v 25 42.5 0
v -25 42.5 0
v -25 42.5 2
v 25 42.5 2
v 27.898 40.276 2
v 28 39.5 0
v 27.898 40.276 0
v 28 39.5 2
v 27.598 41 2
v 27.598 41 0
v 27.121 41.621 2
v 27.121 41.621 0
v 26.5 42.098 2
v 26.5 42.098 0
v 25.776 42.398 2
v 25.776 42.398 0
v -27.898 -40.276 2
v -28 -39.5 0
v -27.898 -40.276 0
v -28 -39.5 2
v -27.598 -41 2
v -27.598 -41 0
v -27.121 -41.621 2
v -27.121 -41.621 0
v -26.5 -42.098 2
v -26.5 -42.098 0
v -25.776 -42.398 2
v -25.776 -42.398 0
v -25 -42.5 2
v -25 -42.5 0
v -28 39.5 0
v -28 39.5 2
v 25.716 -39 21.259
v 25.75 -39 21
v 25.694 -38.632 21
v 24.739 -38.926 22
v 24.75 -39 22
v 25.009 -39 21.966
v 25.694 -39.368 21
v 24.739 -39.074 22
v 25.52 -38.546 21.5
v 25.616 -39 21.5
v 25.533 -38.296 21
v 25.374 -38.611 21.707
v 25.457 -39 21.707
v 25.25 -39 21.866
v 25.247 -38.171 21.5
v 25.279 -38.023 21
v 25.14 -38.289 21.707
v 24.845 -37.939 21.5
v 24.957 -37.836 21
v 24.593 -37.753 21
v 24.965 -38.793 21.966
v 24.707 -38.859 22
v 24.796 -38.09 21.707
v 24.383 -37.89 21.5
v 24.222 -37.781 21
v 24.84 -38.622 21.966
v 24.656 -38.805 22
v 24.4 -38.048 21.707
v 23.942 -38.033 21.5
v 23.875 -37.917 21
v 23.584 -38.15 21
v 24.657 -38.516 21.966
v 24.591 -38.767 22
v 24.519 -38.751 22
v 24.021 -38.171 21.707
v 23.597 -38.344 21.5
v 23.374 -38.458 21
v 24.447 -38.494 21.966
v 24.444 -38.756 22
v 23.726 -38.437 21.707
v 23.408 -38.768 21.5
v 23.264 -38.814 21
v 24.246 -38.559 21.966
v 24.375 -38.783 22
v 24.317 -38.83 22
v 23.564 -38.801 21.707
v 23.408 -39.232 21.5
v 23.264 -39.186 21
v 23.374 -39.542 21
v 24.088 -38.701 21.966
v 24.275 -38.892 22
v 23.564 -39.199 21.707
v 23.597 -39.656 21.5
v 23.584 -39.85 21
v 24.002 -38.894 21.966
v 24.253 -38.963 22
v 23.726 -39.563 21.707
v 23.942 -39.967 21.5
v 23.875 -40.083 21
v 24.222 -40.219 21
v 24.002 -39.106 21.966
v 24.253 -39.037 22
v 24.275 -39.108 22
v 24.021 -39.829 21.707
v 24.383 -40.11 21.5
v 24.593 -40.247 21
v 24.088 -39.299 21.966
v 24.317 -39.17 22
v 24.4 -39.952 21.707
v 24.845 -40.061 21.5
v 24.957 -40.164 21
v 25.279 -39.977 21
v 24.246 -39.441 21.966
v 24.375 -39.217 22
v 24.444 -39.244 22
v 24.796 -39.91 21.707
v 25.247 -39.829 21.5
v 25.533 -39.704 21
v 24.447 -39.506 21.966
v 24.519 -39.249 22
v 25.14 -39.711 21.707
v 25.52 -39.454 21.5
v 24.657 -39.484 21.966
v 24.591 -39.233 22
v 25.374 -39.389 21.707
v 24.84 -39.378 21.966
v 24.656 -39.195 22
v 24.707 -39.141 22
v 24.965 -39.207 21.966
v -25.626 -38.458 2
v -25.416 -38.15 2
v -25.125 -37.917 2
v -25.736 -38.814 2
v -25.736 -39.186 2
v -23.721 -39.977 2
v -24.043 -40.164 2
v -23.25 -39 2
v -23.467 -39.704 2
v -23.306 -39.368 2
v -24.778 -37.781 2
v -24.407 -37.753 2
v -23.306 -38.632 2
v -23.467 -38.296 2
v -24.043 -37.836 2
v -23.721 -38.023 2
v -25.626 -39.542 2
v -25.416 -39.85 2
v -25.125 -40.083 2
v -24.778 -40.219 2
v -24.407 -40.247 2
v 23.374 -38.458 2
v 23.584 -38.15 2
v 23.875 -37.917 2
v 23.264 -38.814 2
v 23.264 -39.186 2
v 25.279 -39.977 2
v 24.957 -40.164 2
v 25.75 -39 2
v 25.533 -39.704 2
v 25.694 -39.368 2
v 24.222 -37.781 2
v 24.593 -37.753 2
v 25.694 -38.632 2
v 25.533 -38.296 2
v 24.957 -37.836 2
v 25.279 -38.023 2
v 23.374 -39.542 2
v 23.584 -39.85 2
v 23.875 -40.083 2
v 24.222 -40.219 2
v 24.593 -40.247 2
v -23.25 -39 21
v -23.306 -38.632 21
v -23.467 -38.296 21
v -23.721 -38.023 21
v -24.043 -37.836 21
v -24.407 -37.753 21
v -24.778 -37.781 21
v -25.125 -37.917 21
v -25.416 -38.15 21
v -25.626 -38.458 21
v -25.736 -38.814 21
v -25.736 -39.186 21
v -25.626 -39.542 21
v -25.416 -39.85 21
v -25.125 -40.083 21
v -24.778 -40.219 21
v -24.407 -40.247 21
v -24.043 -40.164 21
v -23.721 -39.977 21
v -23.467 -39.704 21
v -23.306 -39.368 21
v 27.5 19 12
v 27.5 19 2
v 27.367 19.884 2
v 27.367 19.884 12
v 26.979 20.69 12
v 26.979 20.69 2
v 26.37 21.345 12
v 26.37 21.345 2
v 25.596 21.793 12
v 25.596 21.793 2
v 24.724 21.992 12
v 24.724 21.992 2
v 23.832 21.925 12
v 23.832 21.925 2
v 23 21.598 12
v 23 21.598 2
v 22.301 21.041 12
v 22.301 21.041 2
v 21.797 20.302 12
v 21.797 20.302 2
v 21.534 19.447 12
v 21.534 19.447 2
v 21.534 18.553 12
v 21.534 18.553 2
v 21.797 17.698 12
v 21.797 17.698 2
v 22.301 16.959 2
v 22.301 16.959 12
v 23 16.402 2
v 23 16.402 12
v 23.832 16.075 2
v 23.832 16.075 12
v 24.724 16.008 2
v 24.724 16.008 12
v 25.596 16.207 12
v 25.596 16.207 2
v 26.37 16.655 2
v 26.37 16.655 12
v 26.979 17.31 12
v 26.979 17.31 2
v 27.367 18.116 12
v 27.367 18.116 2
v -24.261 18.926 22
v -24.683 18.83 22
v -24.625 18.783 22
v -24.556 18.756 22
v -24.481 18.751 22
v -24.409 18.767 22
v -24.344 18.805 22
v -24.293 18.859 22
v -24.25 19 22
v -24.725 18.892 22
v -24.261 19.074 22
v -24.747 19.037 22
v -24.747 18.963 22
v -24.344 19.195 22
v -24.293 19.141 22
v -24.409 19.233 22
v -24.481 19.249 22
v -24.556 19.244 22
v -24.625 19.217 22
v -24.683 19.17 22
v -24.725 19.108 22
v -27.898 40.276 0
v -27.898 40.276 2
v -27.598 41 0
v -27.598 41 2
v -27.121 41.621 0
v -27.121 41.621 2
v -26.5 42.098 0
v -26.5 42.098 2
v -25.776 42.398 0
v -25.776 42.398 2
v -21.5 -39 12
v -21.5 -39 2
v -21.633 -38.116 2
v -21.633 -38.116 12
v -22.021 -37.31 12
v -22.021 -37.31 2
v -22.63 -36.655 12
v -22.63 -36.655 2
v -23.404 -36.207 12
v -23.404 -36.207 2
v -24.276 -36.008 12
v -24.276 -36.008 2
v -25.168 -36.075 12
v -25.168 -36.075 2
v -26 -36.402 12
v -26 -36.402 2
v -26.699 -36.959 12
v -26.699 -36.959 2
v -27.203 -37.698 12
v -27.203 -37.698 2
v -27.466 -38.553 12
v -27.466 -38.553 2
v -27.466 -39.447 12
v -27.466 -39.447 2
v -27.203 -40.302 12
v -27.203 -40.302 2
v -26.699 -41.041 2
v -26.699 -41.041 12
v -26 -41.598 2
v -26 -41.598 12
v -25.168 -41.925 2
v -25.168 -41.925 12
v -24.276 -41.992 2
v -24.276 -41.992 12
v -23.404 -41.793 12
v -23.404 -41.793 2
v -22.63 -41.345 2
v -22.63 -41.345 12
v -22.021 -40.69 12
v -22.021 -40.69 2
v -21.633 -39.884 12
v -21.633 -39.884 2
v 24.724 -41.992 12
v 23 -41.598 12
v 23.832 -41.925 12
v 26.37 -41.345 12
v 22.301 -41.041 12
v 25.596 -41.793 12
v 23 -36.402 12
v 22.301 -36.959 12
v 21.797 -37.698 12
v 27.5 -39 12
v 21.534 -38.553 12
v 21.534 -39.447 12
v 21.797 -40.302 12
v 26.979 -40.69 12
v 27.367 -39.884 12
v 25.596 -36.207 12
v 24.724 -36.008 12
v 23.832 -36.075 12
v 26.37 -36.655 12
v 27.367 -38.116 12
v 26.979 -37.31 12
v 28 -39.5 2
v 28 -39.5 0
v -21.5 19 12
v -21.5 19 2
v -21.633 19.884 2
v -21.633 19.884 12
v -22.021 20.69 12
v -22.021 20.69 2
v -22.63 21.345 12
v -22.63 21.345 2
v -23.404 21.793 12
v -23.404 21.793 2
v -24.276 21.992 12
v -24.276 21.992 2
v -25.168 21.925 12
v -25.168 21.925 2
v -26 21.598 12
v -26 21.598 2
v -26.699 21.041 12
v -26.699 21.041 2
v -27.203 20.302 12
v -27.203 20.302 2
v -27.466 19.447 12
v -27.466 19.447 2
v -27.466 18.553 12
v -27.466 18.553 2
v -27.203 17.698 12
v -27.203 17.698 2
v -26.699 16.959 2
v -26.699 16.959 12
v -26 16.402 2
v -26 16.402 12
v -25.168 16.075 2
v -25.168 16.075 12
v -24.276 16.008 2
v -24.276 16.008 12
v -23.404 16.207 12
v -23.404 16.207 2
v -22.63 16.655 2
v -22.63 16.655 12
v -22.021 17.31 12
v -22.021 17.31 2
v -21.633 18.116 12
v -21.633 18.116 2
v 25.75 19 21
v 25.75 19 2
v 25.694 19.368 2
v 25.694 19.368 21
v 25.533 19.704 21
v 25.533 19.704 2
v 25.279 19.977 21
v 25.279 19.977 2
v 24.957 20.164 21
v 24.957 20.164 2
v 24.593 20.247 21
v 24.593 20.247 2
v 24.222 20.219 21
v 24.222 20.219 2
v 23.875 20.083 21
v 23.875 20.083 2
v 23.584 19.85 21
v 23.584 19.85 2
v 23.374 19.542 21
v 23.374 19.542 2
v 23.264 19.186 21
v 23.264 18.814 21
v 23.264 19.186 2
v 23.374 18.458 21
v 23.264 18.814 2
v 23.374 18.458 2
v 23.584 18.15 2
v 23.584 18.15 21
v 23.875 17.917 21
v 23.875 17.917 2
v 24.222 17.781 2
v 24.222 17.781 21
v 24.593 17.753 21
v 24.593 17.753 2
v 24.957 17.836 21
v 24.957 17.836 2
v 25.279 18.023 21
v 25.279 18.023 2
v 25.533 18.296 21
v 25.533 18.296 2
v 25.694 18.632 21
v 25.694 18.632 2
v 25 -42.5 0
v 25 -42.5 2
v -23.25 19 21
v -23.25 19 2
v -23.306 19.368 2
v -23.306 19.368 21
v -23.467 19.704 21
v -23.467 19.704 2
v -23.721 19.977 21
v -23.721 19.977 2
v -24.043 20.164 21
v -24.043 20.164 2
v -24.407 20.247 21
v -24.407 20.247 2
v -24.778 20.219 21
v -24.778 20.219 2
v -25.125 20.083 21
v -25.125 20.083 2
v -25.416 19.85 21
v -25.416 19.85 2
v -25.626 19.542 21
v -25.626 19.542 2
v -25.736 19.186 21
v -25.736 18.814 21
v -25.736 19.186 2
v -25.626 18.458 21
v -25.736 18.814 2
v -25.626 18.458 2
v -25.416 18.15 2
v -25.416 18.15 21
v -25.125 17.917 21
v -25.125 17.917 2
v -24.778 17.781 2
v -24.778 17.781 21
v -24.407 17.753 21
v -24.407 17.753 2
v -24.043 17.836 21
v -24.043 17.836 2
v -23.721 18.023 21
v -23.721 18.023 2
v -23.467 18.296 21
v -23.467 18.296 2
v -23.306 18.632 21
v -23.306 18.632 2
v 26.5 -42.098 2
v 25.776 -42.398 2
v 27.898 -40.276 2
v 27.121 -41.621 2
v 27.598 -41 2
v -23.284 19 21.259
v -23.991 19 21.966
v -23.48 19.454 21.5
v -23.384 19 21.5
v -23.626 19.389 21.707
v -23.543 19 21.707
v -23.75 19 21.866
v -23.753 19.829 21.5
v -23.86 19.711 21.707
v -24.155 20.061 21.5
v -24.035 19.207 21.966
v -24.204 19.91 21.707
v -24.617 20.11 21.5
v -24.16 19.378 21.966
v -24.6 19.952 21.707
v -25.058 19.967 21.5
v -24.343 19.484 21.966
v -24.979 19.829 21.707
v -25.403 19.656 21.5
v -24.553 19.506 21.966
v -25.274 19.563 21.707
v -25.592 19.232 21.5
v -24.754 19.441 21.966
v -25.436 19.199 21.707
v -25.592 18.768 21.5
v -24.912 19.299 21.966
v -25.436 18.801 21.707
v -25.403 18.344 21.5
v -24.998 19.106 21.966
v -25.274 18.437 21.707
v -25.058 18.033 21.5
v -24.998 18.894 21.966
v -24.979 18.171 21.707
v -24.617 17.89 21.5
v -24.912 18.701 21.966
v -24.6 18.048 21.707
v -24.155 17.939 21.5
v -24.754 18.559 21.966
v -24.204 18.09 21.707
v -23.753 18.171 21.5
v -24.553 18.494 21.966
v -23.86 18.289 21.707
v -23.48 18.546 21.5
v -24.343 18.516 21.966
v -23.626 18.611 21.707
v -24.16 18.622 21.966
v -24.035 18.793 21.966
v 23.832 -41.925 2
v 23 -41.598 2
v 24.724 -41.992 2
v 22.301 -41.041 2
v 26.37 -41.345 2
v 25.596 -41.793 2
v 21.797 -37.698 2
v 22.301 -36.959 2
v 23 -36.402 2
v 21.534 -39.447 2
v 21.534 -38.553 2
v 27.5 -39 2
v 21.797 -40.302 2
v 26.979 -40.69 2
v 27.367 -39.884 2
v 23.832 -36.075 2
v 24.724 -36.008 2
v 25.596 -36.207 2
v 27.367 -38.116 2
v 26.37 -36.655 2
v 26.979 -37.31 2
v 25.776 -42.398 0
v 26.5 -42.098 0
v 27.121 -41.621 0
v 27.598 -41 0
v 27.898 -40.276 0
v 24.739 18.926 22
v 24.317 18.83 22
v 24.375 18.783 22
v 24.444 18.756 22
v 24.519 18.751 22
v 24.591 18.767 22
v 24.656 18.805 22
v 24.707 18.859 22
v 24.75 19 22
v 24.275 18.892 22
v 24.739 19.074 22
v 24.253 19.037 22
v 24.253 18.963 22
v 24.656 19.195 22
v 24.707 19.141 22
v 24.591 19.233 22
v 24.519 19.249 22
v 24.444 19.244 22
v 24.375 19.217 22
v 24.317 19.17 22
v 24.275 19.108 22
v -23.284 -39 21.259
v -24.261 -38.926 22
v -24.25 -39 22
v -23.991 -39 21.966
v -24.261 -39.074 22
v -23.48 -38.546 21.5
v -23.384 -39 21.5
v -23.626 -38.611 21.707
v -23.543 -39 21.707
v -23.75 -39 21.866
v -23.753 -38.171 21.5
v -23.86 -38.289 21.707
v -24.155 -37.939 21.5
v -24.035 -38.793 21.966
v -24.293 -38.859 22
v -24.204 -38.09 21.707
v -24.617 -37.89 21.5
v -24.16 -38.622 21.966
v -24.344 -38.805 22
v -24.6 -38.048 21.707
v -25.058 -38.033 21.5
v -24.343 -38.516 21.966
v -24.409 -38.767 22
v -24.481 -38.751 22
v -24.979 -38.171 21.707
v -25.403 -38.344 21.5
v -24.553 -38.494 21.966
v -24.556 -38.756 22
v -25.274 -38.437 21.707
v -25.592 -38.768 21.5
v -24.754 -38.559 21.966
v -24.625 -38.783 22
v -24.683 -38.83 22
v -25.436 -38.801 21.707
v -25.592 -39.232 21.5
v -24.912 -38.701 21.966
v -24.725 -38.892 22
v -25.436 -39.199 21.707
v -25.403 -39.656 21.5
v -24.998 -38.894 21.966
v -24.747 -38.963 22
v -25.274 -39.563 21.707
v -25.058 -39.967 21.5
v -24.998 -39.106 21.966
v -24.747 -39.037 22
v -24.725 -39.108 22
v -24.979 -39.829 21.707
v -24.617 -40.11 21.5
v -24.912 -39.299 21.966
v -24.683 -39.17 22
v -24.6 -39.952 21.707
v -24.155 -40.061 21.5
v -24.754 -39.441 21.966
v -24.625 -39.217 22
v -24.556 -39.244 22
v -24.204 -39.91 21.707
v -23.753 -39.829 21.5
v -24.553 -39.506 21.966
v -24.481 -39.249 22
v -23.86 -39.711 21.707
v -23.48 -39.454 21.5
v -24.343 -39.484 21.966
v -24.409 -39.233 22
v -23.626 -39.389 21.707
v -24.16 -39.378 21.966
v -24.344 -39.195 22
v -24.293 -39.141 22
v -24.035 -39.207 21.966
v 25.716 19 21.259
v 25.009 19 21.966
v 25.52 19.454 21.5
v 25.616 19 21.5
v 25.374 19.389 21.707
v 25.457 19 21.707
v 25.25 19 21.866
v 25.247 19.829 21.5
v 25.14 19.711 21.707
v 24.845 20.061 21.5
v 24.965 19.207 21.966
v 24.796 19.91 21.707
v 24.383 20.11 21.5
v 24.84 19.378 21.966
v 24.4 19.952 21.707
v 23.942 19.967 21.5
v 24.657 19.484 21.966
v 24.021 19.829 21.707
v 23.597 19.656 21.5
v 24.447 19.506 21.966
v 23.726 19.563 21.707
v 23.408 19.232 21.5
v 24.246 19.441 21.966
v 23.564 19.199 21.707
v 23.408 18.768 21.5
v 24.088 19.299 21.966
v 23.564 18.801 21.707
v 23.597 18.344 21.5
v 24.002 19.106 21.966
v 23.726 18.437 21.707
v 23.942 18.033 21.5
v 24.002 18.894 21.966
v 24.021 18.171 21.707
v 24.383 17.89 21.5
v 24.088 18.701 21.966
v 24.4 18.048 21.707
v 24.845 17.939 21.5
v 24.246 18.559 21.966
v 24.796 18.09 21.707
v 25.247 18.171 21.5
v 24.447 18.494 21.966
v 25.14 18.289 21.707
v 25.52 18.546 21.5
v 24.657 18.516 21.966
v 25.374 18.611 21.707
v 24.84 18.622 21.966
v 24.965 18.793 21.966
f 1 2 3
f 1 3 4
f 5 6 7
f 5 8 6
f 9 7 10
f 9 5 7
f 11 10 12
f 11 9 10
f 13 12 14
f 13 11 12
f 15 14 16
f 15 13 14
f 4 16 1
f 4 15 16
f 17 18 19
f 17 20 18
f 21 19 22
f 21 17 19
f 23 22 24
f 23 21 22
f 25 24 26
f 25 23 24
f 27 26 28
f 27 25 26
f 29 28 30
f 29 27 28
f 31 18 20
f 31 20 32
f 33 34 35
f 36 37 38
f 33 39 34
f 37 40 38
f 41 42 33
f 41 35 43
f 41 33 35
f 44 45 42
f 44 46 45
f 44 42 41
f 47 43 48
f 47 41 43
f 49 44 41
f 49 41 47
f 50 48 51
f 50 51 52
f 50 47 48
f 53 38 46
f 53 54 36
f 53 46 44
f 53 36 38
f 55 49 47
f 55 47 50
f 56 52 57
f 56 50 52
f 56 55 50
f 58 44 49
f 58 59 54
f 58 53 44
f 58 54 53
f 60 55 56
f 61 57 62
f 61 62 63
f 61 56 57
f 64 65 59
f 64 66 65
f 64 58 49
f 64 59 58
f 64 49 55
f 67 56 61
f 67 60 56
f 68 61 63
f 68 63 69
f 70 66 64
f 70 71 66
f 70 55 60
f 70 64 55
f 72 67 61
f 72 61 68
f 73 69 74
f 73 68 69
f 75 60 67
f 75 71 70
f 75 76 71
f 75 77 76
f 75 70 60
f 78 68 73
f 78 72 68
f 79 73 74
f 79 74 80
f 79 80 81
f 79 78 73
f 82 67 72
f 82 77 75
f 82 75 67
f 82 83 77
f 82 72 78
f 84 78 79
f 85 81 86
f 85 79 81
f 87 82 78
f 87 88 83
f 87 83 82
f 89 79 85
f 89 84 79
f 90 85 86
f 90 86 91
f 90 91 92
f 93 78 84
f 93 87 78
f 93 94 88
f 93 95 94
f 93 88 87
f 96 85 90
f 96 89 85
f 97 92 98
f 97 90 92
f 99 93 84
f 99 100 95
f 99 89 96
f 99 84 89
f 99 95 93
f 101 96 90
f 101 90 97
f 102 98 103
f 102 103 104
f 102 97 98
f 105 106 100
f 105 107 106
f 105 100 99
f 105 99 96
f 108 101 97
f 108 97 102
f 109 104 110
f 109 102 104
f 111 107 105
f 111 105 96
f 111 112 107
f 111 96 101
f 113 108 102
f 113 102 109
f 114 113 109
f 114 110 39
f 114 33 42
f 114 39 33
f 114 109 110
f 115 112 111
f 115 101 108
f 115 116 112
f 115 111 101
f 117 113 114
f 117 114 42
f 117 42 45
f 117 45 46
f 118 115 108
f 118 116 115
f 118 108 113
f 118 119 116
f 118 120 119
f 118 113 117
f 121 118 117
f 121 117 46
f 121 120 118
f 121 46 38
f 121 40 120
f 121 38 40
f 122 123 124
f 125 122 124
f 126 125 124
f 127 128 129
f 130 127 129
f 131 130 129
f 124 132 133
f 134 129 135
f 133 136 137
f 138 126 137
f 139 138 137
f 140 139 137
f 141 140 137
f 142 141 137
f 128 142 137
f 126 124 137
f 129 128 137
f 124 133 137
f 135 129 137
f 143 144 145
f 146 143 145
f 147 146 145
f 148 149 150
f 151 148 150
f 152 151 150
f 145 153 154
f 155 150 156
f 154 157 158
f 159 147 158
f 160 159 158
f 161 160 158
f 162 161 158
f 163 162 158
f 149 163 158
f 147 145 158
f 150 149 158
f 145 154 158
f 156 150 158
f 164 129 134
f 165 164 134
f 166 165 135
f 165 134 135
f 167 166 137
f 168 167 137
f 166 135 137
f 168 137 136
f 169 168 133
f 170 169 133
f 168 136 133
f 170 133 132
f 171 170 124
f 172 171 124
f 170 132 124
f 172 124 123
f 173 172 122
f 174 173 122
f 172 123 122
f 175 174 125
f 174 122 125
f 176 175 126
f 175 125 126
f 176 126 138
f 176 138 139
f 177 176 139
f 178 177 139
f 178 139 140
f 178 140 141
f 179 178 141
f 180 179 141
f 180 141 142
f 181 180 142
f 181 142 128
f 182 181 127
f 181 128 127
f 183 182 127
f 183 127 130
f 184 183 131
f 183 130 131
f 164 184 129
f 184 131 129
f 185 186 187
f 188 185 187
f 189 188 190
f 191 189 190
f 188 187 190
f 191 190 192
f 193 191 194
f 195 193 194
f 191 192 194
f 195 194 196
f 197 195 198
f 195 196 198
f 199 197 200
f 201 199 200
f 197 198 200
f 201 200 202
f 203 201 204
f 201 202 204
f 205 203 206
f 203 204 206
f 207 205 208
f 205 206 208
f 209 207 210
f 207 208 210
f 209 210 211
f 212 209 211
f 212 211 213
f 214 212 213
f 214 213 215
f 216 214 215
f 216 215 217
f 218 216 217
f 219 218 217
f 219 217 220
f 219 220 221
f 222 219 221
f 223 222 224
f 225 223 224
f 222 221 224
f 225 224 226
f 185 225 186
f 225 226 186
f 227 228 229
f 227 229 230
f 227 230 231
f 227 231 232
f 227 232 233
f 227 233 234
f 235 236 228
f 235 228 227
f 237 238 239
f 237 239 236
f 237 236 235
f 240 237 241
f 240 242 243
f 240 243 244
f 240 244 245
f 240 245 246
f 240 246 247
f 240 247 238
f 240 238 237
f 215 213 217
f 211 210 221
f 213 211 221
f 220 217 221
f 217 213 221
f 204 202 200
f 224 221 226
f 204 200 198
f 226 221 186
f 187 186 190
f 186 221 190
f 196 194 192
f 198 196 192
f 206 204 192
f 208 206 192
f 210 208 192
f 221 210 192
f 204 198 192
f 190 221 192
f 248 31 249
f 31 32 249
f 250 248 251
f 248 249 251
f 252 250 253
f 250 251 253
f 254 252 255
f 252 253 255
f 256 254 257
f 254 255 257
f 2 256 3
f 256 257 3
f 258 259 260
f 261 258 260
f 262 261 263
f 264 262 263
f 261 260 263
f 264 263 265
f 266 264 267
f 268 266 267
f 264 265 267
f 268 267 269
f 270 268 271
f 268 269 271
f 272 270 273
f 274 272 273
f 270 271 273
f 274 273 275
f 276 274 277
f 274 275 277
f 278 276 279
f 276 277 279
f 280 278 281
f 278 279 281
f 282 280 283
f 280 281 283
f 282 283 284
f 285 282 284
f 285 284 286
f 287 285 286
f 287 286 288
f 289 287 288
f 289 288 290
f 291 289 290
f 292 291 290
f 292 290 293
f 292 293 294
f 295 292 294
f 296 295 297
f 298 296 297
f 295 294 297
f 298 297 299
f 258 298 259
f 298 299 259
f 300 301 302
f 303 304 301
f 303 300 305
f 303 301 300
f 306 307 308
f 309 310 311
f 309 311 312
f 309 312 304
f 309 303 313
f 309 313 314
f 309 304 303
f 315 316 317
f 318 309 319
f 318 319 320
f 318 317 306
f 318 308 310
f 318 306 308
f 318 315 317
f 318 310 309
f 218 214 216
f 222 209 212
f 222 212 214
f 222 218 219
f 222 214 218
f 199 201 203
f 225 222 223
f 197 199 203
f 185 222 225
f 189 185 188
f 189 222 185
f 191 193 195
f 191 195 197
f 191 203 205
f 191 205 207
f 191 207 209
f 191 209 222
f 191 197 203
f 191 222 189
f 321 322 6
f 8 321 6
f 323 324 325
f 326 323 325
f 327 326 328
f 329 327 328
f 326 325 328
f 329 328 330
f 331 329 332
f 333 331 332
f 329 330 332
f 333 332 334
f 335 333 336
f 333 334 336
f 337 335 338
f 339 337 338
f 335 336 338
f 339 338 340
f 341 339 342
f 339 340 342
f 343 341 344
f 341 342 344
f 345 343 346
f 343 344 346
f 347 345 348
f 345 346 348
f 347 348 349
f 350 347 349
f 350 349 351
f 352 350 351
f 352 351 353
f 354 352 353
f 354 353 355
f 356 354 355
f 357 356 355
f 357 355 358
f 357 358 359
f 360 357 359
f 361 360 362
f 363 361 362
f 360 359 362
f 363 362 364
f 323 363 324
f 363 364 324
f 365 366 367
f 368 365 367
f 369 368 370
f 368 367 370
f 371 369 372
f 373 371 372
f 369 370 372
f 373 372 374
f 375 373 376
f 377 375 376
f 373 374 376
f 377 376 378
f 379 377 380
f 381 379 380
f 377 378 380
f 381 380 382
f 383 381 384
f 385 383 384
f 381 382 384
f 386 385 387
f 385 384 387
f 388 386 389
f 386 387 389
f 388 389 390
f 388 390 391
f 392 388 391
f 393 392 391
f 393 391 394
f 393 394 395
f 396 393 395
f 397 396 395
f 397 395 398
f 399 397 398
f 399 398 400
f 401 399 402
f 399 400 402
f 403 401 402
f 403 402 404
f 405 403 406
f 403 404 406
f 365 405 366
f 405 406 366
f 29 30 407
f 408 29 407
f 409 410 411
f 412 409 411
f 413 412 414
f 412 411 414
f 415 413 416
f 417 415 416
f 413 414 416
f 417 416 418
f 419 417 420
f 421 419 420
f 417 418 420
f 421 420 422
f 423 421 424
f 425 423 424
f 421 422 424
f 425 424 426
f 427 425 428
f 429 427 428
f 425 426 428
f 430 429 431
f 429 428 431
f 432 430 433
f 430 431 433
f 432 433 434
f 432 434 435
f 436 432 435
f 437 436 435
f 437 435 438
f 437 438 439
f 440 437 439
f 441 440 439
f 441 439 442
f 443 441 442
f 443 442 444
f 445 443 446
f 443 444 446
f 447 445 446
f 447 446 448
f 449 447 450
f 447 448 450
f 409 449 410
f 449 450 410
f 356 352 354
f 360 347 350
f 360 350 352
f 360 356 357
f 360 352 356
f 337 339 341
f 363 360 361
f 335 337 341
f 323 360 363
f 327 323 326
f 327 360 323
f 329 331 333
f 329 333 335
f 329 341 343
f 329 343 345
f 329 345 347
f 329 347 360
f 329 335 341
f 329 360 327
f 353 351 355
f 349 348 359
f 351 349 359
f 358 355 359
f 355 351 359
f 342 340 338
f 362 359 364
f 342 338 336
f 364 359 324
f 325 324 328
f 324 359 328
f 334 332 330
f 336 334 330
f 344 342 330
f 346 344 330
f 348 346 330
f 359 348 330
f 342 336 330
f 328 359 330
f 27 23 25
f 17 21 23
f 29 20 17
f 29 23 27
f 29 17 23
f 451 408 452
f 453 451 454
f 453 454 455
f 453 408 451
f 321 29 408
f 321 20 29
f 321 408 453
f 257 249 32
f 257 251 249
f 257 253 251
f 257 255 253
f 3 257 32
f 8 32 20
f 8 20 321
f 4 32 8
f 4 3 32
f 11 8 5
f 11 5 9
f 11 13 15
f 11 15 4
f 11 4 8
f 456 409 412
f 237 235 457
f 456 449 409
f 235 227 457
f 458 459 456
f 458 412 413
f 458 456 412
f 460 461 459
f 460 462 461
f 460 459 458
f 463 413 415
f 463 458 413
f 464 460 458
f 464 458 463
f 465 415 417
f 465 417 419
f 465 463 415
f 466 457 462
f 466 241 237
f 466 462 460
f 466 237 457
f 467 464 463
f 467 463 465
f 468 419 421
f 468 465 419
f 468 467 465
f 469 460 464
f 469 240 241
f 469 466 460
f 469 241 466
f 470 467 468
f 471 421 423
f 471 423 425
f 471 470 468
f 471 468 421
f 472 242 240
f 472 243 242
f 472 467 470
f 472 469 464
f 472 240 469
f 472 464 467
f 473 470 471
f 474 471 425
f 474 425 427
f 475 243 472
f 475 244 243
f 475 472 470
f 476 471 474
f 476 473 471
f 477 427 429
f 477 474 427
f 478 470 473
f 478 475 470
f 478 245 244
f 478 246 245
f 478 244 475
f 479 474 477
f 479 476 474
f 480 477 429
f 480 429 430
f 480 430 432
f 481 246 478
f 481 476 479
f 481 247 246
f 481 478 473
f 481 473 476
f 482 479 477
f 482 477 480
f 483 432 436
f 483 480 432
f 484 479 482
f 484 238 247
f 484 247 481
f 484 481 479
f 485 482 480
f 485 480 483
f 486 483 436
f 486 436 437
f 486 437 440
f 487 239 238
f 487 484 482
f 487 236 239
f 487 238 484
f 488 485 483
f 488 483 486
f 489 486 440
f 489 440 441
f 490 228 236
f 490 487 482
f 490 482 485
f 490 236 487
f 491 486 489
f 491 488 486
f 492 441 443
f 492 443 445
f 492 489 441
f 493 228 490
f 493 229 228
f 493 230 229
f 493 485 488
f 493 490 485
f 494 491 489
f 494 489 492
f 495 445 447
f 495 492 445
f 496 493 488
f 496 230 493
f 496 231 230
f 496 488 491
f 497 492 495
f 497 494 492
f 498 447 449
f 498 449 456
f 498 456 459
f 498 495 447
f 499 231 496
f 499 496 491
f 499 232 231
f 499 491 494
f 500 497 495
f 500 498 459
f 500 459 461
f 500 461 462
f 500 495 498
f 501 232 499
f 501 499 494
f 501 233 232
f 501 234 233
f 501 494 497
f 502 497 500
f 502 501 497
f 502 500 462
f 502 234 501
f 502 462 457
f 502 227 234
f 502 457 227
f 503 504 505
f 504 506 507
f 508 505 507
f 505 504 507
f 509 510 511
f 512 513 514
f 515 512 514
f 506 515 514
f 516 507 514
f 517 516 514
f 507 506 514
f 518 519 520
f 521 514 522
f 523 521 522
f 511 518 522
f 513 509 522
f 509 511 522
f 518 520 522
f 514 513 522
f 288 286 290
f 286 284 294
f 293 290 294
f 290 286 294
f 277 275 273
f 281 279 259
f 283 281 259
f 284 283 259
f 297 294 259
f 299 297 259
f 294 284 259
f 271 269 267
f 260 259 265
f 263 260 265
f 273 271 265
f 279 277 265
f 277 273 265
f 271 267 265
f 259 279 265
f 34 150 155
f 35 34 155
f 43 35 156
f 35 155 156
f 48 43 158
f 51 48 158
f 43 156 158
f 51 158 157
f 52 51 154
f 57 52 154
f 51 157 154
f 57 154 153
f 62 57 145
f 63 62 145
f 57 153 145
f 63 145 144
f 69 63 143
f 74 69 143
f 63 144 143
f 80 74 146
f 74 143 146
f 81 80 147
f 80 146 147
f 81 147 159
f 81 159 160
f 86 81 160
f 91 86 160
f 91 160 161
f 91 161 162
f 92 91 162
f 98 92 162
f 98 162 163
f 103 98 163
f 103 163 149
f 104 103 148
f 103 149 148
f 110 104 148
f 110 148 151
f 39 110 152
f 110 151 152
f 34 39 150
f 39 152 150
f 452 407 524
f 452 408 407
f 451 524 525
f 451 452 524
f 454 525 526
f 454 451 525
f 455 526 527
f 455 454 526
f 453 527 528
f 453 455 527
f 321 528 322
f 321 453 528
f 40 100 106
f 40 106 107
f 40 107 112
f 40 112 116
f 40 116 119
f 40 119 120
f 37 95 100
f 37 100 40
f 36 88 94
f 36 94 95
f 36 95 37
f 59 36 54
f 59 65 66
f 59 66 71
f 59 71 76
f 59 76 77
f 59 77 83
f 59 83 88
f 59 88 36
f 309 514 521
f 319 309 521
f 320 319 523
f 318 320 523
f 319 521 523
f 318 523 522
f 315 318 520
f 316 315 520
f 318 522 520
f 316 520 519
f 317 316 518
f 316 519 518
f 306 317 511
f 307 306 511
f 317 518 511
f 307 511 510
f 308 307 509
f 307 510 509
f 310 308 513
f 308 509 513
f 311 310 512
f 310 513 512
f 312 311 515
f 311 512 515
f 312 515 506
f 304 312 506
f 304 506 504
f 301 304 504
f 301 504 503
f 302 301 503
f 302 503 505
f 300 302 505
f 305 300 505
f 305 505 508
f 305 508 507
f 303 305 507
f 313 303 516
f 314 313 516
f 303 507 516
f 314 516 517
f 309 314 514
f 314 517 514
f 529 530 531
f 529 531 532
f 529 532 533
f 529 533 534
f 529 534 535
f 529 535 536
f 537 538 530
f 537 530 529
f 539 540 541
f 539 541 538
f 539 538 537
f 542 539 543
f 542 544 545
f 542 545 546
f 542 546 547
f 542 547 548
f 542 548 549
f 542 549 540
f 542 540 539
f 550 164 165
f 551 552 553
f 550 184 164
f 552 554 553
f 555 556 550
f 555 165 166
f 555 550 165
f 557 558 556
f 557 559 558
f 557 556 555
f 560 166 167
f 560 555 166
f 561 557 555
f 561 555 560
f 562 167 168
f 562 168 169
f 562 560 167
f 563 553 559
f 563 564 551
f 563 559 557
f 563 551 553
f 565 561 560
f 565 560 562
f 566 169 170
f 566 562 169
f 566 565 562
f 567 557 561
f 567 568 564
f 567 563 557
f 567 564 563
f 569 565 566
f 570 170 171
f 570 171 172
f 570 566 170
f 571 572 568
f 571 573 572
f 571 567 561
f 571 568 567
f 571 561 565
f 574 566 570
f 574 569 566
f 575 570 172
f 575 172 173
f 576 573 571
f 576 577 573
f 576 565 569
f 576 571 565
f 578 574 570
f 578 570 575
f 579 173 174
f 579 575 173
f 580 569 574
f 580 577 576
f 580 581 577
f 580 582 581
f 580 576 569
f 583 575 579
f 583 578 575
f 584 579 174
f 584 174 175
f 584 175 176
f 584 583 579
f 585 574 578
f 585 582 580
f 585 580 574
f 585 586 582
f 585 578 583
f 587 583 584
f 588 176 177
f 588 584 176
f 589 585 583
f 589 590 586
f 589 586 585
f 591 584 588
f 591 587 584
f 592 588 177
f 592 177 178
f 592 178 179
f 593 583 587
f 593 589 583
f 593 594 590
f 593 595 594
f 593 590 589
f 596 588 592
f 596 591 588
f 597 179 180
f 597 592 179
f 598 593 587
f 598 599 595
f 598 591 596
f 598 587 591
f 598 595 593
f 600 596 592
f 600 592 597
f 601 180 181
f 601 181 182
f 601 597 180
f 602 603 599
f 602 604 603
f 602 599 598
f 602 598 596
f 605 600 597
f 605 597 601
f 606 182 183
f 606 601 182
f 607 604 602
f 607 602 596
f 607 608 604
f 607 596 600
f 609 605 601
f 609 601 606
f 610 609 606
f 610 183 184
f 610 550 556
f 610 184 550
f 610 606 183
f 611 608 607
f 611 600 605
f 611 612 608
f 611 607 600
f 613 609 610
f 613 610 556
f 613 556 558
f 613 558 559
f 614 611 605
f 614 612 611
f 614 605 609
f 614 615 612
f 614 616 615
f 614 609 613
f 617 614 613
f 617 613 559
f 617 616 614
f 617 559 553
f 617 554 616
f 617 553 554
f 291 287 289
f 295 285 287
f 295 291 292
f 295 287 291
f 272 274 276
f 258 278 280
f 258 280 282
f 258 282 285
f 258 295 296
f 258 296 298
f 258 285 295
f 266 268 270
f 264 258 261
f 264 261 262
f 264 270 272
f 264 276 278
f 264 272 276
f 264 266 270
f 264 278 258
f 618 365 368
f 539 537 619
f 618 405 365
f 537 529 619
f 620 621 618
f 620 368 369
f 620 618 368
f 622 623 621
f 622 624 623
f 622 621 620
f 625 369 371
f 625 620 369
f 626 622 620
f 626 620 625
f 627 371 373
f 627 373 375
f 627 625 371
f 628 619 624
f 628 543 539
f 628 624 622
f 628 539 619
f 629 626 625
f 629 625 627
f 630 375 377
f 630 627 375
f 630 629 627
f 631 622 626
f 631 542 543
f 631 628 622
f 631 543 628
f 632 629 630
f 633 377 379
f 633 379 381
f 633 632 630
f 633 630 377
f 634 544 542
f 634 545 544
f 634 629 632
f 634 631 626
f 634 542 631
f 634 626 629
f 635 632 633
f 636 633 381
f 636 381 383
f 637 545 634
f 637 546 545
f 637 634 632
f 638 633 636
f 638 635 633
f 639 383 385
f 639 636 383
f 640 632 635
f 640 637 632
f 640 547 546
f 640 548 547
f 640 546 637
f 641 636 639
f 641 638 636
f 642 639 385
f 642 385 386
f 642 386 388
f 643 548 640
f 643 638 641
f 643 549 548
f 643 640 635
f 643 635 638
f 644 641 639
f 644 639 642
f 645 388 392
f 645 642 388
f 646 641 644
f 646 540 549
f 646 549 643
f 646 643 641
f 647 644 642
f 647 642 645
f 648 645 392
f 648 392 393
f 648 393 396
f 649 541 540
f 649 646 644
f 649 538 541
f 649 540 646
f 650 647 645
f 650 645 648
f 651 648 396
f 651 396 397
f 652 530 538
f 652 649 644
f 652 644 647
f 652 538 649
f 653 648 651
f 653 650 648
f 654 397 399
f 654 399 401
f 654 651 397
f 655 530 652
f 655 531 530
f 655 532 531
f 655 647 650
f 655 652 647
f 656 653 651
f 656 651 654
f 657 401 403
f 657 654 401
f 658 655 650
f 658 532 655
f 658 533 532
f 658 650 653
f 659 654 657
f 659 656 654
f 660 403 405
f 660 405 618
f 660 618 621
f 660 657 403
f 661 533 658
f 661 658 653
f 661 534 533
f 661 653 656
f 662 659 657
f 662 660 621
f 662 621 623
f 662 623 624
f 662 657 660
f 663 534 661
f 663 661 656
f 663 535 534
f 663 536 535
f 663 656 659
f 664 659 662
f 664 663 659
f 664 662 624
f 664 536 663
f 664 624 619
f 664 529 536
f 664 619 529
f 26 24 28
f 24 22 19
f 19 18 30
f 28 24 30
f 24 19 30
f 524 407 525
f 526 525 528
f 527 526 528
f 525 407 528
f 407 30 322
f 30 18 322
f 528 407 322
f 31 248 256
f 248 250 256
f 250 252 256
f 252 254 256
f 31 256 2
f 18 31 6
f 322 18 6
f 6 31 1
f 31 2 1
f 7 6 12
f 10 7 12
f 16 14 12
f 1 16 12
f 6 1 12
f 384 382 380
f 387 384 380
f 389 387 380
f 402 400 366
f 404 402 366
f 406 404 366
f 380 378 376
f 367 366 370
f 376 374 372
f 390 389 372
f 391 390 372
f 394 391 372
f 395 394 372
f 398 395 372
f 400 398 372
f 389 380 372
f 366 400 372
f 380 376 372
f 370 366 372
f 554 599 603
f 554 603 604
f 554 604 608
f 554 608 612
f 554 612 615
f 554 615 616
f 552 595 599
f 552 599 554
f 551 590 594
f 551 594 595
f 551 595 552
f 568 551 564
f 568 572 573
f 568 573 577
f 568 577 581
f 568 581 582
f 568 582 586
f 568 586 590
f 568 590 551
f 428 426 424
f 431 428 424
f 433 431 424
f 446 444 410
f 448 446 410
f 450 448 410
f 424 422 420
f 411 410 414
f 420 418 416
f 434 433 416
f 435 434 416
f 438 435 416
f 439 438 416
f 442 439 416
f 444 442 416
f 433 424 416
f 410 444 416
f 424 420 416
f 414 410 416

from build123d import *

# Parameters (mm, degrees)
F0_W     = 56
F0_H     = 85
F1_DEPTH = 2
F2_R     = 3
F3_R     = 1.25
F5_DEPTH = 20
F4_R     = 3
F6_DEPTH = 10
F7_R     = 1


with BuildPart() as f1:
    # F0 (on Top) → F1 (new body)
    with BuildSketch(Plane.XY):
        Rectangle(F0_W, F0_H)
    extrude(amount=F1_DEPTH)

    # F2
    f2_edges = [f1.edges().sort_by_distance(p)[0] for p in [
        (-28, 42.5, 1),
        (28, 42.5, 1),
        (28, -42.5, 1),
        (-28, -42.5, 1),
    ]]
    fillet(f2_edges, radius=F2_R)


with BuildPart() as f5:
    # F3 (on face) → F5 (new body)
    with BuildSketch(Plane.XY.offset(2)):
        with Locations((-24.5, -39)):
            Circle(F3_R)
        with Locations((24.5, -39)):
            Circle(F3_R)
        with Locations((-24.5, 19)):
            Circle(F3_R)
        with Locations((24.5, 19)):
            Circle(F3_R)
    extrude(amount=F5_DEPTH)

    # F7
    f7_edges = [f5.edges().sort_by_distance(p)[0] for p in [
        (-25.75, 19, 22),
        (-25.75, -39, 22),
        (23.25, -39, 22),
        (23.25, 19, 22),
    ]]
    fillet(f7_edges, radius=F7_R)


with BuildPart() as f6:
    # F4 (on face) → F6 (new body)
    with BuildSketch(Plane.XY.offset(2)):
        with Locations((-24.5, 19)):
            Circle(F4_R)
        with Locations((24.5, 19)):
            Circle(F4_R)
        with Locations((-24.5, -39)):
            Circle(F4_R)
        with Locations((24.5, -39)):
            Circle(F4_R)
    extrude(amount=F6_DEPTH)


solid = Compound([f1.part, f5.part, f6.part])
